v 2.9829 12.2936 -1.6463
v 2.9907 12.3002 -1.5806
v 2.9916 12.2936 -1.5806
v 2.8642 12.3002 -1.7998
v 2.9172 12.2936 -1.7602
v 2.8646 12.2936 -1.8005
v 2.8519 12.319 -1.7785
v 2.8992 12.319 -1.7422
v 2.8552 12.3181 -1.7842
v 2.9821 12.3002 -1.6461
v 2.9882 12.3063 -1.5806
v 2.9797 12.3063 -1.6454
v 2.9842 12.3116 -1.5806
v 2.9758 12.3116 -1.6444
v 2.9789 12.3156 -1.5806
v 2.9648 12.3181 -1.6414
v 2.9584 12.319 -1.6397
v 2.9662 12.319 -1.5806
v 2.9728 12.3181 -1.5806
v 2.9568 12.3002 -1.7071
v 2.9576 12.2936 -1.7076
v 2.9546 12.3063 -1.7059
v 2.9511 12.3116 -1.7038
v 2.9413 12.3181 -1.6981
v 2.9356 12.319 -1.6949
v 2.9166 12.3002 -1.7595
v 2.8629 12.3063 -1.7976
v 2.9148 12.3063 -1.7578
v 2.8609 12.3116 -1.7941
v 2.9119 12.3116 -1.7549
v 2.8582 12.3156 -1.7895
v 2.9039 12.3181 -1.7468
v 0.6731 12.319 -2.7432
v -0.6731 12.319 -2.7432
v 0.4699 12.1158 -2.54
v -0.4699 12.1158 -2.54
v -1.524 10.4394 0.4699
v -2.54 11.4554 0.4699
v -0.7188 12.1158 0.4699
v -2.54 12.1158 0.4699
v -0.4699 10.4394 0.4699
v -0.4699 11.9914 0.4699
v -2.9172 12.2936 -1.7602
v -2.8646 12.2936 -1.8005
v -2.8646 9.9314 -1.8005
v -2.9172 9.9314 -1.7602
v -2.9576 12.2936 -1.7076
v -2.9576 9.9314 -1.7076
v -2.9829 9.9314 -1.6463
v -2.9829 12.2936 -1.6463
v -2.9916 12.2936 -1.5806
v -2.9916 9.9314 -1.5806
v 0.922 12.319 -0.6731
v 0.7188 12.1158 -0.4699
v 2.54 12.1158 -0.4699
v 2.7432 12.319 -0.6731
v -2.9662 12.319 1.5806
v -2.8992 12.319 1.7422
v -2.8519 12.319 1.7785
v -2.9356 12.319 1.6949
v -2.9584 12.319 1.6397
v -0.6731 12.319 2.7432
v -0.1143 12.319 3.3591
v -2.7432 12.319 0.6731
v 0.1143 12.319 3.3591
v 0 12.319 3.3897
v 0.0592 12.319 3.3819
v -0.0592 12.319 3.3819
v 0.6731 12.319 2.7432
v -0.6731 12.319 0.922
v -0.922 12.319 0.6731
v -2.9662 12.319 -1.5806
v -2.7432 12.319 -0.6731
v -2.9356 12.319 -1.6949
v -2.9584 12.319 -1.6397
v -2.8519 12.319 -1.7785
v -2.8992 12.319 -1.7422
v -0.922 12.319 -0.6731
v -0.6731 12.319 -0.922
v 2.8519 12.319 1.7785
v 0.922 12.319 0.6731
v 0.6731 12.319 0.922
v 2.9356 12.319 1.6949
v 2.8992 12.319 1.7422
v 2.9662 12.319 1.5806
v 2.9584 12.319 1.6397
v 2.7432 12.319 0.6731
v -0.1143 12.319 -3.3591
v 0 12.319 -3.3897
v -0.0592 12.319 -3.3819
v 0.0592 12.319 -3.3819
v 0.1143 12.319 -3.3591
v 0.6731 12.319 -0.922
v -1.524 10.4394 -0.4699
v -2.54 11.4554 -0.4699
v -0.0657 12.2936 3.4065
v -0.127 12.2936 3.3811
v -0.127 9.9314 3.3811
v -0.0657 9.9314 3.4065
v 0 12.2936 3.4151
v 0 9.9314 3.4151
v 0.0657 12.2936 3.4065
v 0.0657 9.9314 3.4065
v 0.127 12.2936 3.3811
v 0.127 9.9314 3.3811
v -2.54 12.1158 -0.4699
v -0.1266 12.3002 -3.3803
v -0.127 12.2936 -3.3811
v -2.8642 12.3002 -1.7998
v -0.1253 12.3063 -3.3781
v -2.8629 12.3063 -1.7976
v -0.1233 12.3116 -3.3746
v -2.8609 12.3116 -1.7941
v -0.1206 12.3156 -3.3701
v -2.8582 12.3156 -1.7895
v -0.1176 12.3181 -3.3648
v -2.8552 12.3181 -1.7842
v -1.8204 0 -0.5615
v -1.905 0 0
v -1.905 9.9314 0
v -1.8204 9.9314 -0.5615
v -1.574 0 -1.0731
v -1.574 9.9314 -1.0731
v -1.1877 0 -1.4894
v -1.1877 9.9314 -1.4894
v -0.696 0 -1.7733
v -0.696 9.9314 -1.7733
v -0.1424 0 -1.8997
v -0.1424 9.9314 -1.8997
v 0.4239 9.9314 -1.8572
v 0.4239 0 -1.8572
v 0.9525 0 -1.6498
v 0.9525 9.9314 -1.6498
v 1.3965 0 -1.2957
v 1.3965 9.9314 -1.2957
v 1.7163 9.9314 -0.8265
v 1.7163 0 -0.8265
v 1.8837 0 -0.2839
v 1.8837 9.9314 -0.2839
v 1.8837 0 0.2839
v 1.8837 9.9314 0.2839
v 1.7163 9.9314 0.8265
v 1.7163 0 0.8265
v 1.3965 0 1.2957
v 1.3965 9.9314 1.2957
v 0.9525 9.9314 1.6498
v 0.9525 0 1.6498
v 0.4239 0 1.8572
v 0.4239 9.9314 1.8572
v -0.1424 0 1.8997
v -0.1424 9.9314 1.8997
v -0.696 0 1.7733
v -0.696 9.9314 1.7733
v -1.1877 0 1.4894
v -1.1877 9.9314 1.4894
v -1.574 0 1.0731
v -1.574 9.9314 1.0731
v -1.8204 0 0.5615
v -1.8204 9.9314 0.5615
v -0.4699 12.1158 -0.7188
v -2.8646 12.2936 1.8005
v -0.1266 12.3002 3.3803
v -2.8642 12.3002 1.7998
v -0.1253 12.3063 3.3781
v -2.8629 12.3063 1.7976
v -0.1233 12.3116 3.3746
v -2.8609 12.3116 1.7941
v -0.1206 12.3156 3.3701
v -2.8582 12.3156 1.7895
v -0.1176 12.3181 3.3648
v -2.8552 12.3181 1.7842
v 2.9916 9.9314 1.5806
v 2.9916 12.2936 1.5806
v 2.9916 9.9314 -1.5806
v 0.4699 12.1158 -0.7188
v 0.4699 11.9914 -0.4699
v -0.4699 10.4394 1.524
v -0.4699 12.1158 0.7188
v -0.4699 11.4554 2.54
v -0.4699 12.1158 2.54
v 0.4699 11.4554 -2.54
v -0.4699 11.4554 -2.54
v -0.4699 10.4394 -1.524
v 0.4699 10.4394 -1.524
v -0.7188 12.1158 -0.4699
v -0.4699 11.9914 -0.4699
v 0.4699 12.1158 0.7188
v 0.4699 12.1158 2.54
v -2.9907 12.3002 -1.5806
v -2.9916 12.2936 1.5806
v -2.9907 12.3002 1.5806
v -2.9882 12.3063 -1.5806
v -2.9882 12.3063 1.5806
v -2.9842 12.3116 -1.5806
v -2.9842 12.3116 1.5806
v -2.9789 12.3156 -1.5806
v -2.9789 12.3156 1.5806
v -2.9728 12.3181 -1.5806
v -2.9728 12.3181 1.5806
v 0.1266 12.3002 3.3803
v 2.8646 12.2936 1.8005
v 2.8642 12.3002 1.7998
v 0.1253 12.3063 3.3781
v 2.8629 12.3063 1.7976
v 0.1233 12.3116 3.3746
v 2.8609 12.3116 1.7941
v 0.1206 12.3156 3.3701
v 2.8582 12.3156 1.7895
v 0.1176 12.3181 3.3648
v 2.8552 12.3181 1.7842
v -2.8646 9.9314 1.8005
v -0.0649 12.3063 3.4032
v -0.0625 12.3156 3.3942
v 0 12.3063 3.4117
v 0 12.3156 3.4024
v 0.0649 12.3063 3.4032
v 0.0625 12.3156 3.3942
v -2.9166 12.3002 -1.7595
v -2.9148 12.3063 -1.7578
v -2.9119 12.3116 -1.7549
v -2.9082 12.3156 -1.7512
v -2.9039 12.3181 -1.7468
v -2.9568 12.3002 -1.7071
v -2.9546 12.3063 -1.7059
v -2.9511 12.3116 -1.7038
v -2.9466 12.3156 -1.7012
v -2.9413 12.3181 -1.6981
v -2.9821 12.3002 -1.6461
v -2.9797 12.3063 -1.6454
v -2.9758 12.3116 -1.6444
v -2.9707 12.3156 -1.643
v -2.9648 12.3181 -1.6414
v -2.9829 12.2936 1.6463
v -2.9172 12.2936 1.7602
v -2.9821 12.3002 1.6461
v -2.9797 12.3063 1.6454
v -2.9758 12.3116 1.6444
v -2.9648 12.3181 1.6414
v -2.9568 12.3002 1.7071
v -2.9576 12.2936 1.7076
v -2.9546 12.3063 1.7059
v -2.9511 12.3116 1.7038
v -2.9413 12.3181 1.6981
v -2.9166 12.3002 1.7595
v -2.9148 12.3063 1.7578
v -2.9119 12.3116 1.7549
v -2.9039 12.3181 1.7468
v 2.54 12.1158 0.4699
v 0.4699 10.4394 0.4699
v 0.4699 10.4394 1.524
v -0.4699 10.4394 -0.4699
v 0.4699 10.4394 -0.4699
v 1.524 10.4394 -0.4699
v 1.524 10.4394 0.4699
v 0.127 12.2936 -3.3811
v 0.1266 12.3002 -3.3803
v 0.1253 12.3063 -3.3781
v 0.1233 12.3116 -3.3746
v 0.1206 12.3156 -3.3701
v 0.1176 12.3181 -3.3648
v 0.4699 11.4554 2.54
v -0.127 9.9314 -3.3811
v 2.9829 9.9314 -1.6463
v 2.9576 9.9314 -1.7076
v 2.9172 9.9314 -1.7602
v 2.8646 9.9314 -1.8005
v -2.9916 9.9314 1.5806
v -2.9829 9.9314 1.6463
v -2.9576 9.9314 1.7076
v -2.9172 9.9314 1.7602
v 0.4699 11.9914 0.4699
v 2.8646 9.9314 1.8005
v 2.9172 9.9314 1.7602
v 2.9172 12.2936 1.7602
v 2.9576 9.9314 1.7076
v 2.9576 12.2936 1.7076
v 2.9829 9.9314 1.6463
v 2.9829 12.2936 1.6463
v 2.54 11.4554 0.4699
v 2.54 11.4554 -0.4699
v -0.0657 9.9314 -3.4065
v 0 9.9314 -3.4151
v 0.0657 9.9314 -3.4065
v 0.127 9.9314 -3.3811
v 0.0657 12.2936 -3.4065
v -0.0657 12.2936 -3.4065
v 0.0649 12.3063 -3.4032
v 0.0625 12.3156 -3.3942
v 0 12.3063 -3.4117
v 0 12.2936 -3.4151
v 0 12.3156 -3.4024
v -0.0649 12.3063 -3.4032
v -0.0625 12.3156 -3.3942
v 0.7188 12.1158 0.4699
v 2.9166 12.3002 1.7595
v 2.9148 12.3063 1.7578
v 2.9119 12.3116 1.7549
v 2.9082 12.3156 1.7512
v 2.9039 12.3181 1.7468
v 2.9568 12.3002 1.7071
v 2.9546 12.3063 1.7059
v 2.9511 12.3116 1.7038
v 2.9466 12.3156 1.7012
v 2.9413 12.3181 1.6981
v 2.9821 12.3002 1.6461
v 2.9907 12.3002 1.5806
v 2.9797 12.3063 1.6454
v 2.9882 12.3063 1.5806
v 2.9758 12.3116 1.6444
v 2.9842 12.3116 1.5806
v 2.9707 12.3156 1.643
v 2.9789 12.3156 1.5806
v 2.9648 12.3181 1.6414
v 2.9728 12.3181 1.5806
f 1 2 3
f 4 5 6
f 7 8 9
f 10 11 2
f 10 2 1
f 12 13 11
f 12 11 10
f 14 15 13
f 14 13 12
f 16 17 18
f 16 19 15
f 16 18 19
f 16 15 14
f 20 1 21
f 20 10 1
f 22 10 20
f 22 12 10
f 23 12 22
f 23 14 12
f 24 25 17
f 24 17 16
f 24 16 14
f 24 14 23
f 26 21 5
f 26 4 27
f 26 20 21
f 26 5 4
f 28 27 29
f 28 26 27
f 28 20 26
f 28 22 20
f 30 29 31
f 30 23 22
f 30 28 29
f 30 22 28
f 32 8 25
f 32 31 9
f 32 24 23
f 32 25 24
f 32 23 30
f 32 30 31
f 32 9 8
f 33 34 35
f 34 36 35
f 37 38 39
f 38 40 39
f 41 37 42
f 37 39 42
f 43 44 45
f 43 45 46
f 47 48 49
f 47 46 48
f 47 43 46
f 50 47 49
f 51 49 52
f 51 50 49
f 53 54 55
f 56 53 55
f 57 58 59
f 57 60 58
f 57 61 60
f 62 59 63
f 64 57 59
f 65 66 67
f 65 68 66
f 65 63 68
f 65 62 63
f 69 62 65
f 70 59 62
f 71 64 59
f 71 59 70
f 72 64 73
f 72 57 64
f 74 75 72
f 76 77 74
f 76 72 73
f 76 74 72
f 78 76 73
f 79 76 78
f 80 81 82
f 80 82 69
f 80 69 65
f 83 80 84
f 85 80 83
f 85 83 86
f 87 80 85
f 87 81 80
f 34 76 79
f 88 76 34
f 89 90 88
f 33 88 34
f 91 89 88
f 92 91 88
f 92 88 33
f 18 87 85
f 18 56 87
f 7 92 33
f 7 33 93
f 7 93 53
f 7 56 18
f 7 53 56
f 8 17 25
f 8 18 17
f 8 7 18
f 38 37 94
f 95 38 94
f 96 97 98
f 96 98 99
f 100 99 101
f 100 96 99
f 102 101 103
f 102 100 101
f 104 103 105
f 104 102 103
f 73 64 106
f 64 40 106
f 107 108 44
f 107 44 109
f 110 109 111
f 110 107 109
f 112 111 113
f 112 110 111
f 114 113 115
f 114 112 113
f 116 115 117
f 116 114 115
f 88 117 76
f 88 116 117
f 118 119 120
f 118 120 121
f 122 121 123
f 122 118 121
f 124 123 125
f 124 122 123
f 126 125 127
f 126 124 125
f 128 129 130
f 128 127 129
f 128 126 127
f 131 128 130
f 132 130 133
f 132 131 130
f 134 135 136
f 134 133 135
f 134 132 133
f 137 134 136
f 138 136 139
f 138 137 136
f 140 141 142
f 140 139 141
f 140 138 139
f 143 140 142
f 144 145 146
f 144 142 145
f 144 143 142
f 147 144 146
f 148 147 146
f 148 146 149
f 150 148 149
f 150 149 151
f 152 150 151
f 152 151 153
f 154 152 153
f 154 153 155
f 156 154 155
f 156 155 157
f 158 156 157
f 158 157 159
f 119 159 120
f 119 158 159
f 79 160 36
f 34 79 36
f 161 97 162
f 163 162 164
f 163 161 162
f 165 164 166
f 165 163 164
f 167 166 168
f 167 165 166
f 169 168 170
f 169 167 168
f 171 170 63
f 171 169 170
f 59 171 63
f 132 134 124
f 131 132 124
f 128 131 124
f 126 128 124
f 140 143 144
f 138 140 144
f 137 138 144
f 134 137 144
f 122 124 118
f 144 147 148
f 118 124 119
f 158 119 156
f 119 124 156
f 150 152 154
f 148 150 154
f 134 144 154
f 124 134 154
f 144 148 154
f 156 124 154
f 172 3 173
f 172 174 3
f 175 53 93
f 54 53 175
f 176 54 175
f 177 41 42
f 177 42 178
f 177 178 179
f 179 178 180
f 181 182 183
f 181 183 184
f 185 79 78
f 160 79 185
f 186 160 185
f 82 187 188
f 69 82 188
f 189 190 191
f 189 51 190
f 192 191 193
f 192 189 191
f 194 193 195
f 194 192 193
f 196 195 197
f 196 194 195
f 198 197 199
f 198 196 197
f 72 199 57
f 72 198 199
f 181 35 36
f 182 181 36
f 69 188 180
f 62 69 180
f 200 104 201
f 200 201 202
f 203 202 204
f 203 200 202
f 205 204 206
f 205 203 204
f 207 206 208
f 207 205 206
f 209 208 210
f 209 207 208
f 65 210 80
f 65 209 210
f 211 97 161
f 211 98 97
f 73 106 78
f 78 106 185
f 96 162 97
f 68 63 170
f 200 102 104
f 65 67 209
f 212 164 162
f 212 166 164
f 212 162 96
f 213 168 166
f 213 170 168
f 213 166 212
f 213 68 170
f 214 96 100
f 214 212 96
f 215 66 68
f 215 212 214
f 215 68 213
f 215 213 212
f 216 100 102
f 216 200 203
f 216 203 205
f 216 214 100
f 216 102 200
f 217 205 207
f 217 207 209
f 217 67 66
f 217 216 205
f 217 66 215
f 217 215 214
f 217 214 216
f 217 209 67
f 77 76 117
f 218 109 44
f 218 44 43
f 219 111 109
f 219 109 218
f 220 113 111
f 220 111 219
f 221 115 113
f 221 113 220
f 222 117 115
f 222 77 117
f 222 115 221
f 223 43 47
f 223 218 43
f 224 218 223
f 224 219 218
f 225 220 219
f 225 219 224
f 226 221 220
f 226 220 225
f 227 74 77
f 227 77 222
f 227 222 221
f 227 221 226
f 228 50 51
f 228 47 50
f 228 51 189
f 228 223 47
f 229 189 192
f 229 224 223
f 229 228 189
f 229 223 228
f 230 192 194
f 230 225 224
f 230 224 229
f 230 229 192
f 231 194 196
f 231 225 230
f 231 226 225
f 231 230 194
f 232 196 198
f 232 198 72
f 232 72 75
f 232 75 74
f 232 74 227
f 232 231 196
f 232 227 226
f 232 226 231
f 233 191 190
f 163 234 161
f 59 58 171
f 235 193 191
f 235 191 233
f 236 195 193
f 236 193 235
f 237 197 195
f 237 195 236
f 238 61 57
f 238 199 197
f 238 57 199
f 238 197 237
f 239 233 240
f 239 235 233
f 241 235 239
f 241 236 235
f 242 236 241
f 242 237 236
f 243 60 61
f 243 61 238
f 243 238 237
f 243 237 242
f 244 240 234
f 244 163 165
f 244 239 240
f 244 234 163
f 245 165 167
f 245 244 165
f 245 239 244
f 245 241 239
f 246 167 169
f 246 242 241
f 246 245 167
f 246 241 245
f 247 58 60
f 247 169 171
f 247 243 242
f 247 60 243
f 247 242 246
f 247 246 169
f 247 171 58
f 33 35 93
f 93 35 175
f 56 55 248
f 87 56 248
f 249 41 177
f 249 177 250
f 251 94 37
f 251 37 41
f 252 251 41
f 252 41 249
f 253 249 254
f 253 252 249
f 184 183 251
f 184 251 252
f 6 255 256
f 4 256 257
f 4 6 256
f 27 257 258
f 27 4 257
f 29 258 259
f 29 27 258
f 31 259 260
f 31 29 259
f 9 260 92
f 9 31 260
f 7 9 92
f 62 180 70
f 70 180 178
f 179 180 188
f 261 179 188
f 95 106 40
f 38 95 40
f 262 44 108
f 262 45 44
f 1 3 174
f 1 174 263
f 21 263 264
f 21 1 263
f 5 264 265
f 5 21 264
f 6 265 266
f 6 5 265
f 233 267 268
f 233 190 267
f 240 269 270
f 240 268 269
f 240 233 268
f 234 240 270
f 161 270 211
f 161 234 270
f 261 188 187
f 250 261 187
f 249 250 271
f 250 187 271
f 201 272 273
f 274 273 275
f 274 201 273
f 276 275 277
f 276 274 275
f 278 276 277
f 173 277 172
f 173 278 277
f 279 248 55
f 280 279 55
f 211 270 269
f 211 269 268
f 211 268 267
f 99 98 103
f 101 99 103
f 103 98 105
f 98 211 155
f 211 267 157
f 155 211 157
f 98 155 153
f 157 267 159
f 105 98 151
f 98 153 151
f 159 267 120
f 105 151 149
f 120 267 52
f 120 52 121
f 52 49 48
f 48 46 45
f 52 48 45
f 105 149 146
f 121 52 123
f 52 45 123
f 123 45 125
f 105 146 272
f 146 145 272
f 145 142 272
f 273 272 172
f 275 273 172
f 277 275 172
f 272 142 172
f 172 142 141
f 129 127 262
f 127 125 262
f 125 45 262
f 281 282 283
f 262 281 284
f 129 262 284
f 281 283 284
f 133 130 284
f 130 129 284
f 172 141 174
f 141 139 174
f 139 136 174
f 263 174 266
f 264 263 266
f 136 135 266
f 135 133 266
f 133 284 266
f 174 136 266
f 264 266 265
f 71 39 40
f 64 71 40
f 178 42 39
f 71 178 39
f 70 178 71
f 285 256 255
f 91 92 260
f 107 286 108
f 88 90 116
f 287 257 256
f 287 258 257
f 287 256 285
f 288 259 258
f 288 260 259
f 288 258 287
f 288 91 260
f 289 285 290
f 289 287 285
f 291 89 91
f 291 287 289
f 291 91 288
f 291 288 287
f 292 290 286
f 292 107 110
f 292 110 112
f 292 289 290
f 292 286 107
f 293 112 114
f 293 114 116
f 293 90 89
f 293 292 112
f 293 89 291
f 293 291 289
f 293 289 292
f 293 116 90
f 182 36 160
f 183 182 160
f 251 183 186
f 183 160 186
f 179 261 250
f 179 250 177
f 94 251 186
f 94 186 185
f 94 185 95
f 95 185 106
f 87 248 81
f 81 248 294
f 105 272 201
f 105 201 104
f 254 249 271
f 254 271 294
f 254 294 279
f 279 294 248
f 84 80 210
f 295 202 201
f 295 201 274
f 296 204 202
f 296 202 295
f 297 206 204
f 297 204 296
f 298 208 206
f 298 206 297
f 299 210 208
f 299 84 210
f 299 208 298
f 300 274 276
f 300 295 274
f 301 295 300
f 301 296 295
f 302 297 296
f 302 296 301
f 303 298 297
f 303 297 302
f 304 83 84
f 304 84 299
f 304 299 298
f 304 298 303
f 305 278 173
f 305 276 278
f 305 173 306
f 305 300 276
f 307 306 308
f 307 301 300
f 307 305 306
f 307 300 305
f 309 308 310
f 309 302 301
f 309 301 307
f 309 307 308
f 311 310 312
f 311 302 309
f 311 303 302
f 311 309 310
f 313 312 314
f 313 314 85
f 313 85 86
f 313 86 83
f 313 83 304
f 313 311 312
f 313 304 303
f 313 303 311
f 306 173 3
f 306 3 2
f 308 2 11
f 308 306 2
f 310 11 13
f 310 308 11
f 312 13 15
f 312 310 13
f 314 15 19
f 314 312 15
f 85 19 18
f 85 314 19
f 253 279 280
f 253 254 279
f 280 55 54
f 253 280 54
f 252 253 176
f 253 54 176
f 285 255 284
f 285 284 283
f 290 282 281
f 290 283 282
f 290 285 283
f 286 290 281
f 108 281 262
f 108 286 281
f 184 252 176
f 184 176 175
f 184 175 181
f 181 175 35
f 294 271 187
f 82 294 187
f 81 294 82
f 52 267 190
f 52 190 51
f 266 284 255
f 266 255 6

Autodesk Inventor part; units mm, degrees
ref_plane "YZ Plane" through (0, 0, 0) normal (1, 0, 0) x (0, 1, 0)
ref_plane "XZ Plane" through (0, 0, 0) normal (0, 1, 0) x (-1, 0, 0)
ref_plane "XY Plane" through (0, 0, 0) normal (0, 0, 1) x (1, 0, 0)
sketch "Sketch1" plane through (0, 0, 0) normal (0, 1, 0) x (-1, 0, 0)
  circle A0 centre (0, 0) radius 1.905
  dimension "d0" = 3.81
extrude "Extrusion1" add sketch "Sketch1" along normal blind 9.9314
thread "Thread1" size "8-32 UNC" class "2A" standard "ANSI Unified Screw Threads" length 6.9342 offset 2.54
sketch "Sketch2" plane through (0, 9.9314, 0) normal (0, 1, 0) x (1, 0, 0)
  line L0 (0, -3.4544) -> (-2.9916, -1.7272)
  line L1 (-2.9916, -1.7272) -> (-2.9916, 1.7272)
  line L2 (-2.9916, 1.7272) -> (0, 3.4544)
  line L3 (0, 3.4544) -> (2.9916, 1.7272)
  line L4 (2.9916, 1.7272) -> (2.9916, -1.7272)
  line L5 (2.9916, -1.7272) -> (0, -3.4544)
  point P0 (0, 0)
  point P1 (0, 0)
  dimension "d7" = 6.9088
extrude "Extrusion2" add sketch "Sketch2" along normal blind 2.3876
fillet "Fillet1" radius 0.254 6 edges at (2.9916, 11.1252, -1.7272) (0, 11.1252, -3.4544) (-2.9916, 11.1252, -1.7272) (-2.9916, 11.1252, 1.7272) (2.9916, 11.1252, 1.7272) (0, 11.1252, 3.4544)
fillet "Fillet2" radius 0.0254 12 edges at (-2.9576, 12.319, 1.7076) (-1.4958, 12.319, 2.5908) (0, 12.319, 3.4151) (1.4958, 12.319, 2.5908) (2.9576, 12.319, 1.7076) (2.9916, 12.319, 0) (2.9576, 12.319, -1.7076) (1.4958, 12.319, -2.5908) (0, 12.319, -3.4151) (-1.4958, 12.319, -2.5908) (-2.9576, 12.319, -1.7076) (-2.9916, 12.319, 0)
sketch "Sketch3" plane through (0, 12.319, 0) normal (0, 1, 0) x (1, 0, 0)
  line L0 (2.54, 0.4699) -> (-2.54, 0.4699)
  line L1 (-2.54, 0.4699) -> (-2.54, -0.4699)
  line L2 (-2.54, -0.4699) -> (2.54, -0.4699)
  line L3 (2.54, -0.4699) -> (2.54, 0.4699)
  line L4 (0.4699, 2.54) -> (-0.4699, 2.54)
  line L5 (-0.4699, 2.54) -> (-0.4699, -2.54)
  line L6 (-0.4699, -2.54) -> (0.4699, -2.54)
  line L7 (0.4699, -2.54) -> (0.4699, 2.54)
  line L8 (2.9916, -1.5806) -> (2.9916, 1.5806) projected
  line L9 (-2.9662, -1.5806) -> (-2.9662, 1.5806) projected
  point P0 (0, 0)
  point P1 (2.54, 0)
  point P2 (-0.4699, 0)
  point P3 (0, -2.54)
  point P4 (0, -0.4699)
  dimension "d12" = 0.9398
  dimension "d13" = 0.9398
  dimension "d14" = 5.08
  dimension "d15" = 5.08
  dimension "d16" = 0.4516
  dimension "d17" = 0.4262
extrude "Extrusion3" cut sketch "Sketch3" against normal blind 1.8796
chamfer "Chamfer1" distance 0.2032 angle 45 12 edges at (-1.505, 12.319, -0.4699) (-1.505, 12.319, 0.4699) (-2.54, 12.319, 0) (-0.4699, 12.319, -1.505) (0, 12.319, -2.54) (0.4699, 12.319, -1.505) (1.505, 12.319, -0.4699) (2.54, 12.319, 0) (1.505, 12.319, 0.4699) (0.4699, 12.319, 1.505) (0, 12.319, 2.54) (-0.4699, 12.319, 1.505)
chamfer "Chamfer2" distance 0.2032 angle 45 4 edges at (-0.5715, 12.2174, -0.5715) (0.5715, 12.2174, -0.5715) (-0.5715, 12.2174, 0.5715) (0.5715, 12.2174, 0.5715)
chamfer "Chamfer3" distance 1.016 angle 45 1 edges at (2.54, 10.4394, 0)
chamfer "Chamfer4" distance 1.016 angle 45 3 edges at (0, 10.4394, 2.54) (-2.54, 10.4394, 0) (0, 10.4394, -2.54)
properties part number "SSR-40 DA Screw" material "Nickel-Copper Alloy 400"
